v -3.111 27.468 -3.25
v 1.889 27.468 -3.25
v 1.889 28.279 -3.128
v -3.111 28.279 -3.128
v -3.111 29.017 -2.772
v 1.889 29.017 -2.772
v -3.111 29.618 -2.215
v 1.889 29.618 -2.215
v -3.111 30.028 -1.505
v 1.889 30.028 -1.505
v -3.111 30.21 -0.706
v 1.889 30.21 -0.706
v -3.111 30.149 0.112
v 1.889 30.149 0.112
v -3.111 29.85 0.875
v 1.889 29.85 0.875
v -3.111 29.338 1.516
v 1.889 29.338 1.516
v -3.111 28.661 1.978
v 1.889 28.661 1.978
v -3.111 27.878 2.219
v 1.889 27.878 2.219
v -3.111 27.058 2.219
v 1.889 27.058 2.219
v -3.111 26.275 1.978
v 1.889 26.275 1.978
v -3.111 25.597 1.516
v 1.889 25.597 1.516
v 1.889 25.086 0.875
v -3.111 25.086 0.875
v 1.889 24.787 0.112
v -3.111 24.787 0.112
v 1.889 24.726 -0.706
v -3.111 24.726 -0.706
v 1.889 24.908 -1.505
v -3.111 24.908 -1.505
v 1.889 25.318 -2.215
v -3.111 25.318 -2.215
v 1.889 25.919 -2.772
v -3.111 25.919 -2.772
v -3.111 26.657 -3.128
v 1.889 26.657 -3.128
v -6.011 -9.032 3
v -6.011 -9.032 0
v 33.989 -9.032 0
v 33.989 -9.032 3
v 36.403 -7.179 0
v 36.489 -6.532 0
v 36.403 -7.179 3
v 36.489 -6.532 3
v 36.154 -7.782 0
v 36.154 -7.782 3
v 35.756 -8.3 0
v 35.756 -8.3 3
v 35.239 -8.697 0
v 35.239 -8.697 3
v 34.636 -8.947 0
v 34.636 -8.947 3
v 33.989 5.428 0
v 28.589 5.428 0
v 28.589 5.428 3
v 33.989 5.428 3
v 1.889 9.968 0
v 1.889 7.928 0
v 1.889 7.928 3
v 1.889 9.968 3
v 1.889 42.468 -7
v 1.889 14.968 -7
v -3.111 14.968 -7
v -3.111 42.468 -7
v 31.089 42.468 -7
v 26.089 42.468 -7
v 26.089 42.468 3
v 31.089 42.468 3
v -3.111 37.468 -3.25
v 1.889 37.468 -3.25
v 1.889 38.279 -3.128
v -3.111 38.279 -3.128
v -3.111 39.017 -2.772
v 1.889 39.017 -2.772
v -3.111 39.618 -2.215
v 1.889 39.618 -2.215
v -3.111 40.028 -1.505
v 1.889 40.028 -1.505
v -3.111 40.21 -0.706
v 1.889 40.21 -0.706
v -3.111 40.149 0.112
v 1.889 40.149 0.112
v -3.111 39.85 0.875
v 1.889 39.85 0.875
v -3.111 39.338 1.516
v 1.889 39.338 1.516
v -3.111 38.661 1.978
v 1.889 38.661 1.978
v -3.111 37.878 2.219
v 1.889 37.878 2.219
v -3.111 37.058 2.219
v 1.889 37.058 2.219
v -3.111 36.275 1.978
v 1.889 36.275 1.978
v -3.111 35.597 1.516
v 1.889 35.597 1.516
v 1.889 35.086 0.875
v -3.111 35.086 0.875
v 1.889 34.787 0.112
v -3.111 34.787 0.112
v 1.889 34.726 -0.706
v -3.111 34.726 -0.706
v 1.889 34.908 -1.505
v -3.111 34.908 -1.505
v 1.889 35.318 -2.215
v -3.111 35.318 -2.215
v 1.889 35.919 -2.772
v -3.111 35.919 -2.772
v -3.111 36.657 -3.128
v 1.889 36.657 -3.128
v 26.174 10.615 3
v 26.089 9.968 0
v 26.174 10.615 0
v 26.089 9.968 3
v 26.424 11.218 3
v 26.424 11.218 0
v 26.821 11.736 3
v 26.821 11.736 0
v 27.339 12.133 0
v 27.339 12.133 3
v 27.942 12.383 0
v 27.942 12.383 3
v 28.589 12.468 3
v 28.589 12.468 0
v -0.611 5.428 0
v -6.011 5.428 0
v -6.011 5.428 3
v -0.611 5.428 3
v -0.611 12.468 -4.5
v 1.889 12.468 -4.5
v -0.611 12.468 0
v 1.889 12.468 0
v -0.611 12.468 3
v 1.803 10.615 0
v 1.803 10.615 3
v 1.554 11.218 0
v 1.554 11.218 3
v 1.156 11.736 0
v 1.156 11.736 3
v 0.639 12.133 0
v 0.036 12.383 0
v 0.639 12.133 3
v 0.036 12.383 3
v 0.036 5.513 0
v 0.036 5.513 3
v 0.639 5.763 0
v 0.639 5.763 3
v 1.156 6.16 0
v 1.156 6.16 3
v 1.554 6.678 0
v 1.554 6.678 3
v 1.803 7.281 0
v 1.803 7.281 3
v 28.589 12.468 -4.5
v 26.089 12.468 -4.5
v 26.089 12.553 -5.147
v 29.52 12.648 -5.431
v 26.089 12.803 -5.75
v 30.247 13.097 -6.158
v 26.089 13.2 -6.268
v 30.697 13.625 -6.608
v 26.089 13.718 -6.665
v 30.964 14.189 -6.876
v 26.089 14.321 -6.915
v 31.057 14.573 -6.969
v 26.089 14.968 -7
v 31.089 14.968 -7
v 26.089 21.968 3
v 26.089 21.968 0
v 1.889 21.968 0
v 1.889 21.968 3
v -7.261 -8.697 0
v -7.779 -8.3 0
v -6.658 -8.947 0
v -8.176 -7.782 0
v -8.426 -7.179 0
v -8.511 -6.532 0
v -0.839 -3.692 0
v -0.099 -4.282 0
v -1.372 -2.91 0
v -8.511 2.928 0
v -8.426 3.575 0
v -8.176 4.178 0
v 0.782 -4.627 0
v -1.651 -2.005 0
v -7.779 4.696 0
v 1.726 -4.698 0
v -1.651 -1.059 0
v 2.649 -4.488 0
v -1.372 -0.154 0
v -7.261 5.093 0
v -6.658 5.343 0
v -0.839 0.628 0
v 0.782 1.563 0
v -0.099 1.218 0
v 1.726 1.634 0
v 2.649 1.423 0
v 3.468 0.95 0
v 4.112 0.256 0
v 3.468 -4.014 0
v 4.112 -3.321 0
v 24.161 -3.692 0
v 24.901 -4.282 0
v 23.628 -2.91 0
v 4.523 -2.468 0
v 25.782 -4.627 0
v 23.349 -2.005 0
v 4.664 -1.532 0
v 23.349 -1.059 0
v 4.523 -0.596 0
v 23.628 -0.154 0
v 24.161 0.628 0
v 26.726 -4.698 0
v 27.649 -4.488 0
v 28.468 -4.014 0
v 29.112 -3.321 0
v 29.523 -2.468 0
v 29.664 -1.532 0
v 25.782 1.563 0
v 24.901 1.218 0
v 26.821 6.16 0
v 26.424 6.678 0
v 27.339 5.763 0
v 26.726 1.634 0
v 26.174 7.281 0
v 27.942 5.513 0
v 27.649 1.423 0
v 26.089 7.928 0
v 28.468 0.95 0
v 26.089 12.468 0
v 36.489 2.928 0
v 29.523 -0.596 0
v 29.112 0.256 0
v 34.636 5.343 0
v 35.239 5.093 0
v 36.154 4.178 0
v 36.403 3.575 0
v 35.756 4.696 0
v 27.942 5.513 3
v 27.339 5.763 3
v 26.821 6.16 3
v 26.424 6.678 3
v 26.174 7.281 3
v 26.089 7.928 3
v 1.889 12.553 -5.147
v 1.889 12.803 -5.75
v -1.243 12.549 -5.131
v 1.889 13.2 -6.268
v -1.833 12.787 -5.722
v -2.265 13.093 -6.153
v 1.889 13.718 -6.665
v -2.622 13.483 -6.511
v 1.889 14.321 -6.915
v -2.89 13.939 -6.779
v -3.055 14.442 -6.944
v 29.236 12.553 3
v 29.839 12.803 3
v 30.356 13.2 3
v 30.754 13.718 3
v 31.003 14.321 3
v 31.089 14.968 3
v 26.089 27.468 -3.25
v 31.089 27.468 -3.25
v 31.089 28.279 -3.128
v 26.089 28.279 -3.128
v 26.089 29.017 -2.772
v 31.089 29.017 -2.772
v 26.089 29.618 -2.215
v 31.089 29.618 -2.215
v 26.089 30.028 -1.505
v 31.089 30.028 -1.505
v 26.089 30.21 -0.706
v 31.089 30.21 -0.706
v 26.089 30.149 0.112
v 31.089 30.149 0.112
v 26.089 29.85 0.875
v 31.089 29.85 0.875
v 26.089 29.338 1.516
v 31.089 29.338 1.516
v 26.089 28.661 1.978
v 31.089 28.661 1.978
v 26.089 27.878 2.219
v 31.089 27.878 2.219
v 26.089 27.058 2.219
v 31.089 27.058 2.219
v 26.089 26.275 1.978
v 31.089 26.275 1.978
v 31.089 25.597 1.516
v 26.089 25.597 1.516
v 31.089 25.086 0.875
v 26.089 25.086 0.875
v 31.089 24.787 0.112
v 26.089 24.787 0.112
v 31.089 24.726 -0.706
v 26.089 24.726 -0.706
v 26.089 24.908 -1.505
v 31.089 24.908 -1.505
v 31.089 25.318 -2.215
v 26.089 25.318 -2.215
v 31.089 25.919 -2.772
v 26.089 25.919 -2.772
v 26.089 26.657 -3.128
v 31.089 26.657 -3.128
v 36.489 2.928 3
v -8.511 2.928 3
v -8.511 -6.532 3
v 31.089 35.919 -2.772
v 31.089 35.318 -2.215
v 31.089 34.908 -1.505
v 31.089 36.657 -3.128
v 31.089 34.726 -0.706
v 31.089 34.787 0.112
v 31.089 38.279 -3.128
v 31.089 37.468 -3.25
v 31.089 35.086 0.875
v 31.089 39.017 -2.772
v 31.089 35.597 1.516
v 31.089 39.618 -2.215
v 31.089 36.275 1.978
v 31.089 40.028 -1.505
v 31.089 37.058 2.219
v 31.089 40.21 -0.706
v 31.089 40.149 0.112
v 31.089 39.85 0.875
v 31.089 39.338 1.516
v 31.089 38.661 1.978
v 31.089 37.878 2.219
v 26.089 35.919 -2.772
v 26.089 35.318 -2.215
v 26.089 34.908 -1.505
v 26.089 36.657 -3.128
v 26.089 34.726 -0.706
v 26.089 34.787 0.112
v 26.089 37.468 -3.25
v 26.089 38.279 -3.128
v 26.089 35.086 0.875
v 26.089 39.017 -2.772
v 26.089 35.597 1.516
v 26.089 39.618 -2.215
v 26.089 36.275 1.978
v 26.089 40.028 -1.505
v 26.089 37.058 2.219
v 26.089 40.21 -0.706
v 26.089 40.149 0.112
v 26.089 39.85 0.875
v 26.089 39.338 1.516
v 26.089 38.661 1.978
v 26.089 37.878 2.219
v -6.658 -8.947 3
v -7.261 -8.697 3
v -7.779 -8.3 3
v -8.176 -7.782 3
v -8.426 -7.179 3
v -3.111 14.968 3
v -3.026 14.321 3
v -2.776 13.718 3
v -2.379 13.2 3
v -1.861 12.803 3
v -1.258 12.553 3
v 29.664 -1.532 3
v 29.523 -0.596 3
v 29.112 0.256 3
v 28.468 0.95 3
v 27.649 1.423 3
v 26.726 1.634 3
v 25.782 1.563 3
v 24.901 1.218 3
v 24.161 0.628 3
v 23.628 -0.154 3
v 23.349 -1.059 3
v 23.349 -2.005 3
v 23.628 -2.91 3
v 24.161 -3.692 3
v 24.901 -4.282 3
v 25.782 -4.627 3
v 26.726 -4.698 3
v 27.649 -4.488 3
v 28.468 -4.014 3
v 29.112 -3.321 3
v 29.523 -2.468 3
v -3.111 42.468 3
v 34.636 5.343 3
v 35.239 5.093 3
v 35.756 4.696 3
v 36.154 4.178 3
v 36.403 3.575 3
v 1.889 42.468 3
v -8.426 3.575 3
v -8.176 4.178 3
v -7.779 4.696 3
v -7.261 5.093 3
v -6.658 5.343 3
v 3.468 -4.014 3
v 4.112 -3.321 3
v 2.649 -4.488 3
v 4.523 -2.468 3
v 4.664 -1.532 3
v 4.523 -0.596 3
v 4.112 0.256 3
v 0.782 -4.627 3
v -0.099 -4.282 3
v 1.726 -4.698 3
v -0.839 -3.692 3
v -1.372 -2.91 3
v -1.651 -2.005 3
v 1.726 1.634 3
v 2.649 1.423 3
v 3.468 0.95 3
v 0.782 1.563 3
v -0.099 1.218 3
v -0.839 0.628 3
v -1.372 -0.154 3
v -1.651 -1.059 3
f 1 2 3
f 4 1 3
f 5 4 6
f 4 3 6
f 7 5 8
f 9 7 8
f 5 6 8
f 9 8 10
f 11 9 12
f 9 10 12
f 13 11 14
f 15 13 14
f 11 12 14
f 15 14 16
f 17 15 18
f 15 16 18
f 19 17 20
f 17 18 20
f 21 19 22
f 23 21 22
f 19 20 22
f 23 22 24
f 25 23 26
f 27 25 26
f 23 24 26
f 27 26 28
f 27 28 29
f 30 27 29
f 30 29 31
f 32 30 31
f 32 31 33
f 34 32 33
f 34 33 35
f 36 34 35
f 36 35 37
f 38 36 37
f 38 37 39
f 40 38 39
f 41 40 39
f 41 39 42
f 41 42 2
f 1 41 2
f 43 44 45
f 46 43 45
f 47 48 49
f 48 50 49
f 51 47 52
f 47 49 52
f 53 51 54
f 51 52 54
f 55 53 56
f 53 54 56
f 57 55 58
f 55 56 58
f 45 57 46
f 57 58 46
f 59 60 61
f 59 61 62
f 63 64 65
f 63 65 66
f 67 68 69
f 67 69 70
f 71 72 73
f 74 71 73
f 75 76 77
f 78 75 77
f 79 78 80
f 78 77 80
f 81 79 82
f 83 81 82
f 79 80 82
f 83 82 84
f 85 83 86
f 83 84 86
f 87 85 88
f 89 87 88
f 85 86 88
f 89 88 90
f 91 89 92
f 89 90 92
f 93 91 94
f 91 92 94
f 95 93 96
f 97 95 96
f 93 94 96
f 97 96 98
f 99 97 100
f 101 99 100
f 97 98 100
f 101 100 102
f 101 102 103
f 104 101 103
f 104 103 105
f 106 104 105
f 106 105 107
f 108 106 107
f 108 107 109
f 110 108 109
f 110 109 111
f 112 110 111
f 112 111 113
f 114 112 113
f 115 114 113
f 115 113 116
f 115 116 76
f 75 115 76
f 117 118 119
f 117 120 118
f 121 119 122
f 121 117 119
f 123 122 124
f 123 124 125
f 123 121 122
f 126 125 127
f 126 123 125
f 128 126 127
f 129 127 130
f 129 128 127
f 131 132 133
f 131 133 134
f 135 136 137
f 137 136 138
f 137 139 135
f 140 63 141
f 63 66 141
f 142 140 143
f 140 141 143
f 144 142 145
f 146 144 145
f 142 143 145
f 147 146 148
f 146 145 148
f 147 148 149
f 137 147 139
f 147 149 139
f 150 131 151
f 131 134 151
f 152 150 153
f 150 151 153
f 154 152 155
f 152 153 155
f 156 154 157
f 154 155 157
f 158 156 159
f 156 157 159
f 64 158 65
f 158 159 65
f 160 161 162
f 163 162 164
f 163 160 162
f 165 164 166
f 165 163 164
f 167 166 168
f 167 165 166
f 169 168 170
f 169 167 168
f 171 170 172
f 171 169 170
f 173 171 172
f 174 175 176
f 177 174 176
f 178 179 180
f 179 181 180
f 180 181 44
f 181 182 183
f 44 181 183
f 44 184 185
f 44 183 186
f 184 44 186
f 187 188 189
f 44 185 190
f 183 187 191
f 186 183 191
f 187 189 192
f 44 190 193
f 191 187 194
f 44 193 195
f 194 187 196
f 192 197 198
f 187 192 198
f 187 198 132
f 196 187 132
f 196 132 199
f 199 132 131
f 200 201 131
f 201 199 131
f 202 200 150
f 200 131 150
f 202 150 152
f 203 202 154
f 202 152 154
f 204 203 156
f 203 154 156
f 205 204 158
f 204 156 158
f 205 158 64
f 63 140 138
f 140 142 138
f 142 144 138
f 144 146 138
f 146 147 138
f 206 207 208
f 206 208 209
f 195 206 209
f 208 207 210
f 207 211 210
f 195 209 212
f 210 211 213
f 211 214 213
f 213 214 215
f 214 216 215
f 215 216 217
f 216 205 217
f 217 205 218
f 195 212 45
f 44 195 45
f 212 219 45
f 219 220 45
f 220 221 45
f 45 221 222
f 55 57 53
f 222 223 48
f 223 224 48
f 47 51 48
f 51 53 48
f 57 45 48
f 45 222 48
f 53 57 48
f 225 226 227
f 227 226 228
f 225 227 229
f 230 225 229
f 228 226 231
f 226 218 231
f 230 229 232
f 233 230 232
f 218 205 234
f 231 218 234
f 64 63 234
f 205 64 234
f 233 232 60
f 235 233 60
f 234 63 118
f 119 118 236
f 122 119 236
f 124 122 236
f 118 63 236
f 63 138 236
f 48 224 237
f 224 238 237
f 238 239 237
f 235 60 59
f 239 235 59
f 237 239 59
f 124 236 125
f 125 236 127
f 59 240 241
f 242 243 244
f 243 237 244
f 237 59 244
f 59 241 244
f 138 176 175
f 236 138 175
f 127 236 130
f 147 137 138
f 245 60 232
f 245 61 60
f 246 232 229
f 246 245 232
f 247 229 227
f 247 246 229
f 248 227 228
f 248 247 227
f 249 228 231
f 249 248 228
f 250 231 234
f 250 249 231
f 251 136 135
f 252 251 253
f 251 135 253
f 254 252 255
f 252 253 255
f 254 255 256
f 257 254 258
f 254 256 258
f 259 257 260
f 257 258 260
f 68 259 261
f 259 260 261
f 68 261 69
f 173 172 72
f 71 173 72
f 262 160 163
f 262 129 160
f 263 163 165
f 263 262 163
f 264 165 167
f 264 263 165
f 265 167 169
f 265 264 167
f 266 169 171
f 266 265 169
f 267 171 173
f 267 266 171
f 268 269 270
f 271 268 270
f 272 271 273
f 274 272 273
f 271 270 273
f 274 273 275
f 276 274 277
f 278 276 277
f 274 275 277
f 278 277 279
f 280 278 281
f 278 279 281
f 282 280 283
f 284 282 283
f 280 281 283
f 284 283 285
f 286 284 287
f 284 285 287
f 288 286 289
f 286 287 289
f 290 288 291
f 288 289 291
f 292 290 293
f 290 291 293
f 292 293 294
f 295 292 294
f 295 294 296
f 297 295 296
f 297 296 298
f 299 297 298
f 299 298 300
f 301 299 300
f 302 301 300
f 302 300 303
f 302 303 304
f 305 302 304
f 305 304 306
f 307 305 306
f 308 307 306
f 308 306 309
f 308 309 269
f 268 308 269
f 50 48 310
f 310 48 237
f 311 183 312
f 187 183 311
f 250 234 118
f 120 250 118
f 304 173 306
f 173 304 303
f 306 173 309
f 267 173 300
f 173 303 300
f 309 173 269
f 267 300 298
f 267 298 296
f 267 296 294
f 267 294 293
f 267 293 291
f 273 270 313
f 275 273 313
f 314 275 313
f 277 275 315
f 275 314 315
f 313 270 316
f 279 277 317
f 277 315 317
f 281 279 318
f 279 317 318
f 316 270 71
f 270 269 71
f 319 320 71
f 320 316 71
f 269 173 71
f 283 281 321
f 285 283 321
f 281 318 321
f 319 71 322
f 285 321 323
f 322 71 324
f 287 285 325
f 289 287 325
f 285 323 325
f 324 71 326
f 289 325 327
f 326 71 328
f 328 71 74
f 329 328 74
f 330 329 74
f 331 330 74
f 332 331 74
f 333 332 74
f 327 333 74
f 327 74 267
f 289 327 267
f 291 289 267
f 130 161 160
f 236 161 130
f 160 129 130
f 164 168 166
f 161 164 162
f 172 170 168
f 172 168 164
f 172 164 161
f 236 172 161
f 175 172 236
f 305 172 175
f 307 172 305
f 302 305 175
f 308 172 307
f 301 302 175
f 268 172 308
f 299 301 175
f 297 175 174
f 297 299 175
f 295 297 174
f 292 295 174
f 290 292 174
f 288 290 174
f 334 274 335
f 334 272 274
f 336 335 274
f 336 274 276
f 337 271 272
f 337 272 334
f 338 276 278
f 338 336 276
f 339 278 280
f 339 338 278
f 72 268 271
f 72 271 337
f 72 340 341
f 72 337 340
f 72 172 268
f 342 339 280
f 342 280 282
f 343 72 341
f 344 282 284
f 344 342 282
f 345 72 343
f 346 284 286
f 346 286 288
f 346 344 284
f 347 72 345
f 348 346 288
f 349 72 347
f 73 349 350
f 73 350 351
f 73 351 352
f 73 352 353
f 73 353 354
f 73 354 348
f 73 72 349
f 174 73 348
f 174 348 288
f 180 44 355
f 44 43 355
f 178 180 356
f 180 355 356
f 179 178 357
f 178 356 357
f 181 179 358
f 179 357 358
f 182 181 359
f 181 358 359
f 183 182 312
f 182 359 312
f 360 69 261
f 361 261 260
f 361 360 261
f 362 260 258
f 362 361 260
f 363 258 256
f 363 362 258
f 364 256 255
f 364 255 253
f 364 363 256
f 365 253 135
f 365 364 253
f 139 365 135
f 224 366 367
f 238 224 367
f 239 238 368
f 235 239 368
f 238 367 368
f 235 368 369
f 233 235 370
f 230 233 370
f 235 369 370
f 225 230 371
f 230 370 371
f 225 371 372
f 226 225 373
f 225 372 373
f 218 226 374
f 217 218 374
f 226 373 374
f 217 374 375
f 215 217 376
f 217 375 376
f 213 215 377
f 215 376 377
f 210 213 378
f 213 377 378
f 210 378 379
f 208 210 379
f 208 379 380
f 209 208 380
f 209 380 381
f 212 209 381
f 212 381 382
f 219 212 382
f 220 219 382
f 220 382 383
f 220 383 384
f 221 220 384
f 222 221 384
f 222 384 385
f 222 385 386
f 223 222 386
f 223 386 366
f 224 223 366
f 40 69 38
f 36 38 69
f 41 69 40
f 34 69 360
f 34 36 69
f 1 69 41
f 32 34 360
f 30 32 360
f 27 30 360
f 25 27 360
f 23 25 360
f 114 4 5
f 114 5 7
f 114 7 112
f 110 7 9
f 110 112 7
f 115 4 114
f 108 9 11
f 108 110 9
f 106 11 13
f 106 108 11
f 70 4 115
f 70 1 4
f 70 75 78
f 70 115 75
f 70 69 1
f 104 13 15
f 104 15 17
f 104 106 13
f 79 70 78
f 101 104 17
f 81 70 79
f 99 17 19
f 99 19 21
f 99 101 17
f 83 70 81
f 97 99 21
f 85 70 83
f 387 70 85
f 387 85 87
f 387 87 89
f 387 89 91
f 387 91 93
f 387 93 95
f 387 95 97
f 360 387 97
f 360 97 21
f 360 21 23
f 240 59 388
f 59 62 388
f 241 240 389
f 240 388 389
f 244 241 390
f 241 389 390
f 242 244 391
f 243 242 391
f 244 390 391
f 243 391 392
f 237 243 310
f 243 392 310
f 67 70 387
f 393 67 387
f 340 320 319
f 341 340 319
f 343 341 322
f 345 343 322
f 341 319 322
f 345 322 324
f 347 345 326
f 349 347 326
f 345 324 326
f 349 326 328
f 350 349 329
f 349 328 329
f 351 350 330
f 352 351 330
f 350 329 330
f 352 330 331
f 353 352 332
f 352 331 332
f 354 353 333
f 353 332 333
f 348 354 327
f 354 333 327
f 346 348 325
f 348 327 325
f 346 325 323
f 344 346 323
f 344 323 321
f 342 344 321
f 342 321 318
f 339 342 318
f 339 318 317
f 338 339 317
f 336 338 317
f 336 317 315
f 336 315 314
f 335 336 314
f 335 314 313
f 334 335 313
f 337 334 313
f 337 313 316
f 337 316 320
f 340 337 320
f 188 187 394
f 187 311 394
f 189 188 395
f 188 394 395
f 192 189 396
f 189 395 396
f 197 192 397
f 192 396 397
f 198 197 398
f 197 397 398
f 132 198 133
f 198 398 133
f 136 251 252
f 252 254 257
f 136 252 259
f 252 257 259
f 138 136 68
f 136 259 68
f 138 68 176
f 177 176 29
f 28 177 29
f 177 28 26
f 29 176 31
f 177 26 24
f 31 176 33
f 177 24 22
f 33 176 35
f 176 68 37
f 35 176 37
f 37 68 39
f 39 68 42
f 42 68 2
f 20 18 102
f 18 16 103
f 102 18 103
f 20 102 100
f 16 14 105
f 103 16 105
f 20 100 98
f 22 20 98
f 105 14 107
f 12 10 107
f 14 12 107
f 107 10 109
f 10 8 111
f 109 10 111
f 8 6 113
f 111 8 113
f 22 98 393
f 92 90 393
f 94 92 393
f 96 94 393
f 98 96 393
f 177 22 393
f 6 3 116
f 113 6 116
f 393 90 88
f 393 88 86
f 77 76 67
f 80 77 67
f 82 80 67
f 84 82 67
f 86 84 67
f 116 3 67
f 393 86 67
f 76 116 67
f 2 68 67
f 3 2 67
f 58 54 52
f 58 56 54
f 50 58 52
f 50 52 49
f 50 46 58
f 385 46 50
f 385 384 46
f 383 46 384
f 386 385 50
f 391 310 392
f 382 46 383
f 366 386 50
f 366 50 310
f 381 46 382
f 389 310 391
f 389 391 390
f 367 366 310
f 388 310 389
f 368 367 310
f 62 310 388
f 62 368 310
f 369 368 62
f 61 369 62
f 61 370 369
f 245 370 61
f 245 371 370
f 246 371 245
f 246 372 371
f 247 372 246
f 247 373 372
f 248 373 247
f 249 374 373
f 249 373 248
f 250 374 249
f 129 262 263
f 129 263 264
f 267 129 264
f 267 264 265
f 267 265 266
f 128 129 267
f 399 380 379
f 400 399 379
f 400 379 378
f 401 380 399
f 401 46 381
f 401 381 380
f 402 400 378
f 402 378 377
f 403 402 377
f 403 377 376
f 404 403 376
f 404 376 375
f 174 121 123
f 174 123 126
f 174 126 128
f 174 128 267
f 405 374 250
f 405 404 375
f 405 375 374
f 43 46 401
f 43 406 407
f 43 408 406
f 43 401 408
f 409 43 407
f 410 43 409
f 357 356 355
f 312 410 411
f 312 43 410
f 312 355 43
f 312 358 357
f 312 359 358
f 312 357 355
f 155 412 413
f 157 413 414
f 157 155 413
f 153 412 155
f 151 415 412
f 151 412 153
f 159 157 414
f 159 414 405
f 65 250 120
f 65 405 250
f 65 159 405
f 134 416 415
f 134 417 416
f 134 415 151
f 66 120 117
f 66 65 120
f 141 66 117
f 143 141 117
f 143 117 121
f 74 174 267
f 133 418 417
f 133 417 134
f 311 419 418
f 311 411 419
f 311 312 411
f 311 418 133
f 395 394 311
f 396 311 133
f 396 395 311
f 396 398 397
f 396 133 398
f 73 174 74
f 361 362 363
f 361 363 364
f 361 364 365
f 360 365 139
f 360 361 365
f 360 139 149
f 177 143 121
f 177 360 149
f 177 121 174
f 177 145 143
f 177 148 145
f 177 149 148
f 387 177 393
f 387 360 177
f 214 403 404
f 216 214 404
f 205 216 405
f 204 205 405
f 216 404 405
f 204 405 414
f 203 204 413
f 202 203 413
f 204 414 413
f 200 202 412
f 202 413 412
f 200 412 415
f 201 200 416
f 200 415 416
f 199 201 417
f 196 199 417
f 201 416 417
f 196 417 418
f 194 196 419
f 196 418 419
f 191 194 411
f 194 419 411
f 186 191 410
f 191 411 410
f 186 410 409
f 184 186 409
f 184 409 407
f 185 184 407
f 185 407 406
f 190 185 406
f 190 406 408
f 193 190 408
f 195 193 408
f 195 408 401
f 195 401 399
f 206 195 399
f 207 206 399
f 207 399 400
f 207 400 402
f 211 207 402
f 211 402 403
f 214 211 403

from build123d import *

# Parameters (mm, degrees)
SKETCH1_W                   = 45
SKETCH1_H                   = 14.46
BOSS_EXTRUDE1_DEPTH         = 3
F_1_4_0_25_DIAMETER_HOLE1_D = 6.35
SKETCH5_W                   = 24.2
SKETCH5_H                   = 37.04
BOSS_EXTRUDE2_DEPTH         = 3
SKETCH6_W                   = 10
SKETCH6_H                   = 30
BOSS_EXTRUDE3_DEPTH         = 5
BOSS_EXTRUDE4_START         = -29.2
SKETCH7_W                   = 10
SKETCH7_H                   = 30
BOSS_EXTRUDE4_DEPTH         = 5
SKETCH12_W                  = 24.2
SKETCH12_H                  = 20.5
CUT_EXTRUDE1_DEPTH          = 3
M5_CLEARANCE_HOLE1_D        = 5.5
FILLET3_R                   = 2.5
FILLET4_R                   = 2.5


with BuildPart() as part:
    # Sketch1 → Boss-Extrude1 (new body)
    with BuildSketch(Plane.XY):
        with Locations((13.988651535, -1.802042724)):
            Rectangle(SKETCH1_W, SKETCH1_H)
    extrude(amount=BOSS_EXTRUDE1_DEPTH)

    # 1/4 (0.25) Diameter Hole1 (through all)
    with Locations(Plane(origin=(0, 0, 0), x_dir=(-1, 0, 0), z_dir=(0, 0, -1))):
        with Locations((-26.488651535, -1.532042724), (-1.488651535, -1.532042724)):
            Hole(F_1_4_0_25_DIAMETER_HOLE1_D / 2)

    # Sketch5 → Boss-Extrude2 (add)
    with BuildSketch(Plane(origin=(0, 0, 0), x_dir=(-1, 0, 0), z_dir=(0, 0, -1))):
        with Locations((-13.988651535, 23.947957276)):
            Rectangle(SKETCH5_W, SKETCH5_H)
    extrude(amount=-BOSS_EXTRUDE2_DEPTH)

    # Sketch6 → Boss-Extrude3 (add)
    with BuildSketch(Plane.ZY.offset(-1.888651535)):
        with Locations((-2, 27.467957276)):
            Rectangle(SKETCH6_W, SKETCH6_H)
    extrude(amount=BOSS_EXTRUDE3_DEPTH)

    # Sketch7 → Boss-Extrude4 (add)
    with BuildSketch(Plane.ZY.offset(3.111348465).offset(BOSS_EXTRUDE4_START)):
        with Locations((-2, 27.467957276)):
            Rectangle(SKETCH7_W, SKETCH7_H)
    extrude(amount=-BOSS_EXTRUDE4_DEPTH)

    # Sketch12 → Cut-Extrude1 (cut)
    with BuildSketch(Plane(origin=(0, 0, 0), x_dir=(-1, 0, 0), z_dir=(0, 0, -1))):
        with Locations((-13.988651535, 32.217957276)):
            Rectangle(SKETCH12_W, SKETCH12_H)
    extrude(amount=-CUT_EXTRUDE1_DEPTH, mode=Mode.SUBTRACT)

    # M5 Clearance Hole1 (through all)
    with Locations(Plane.ZY.offset(3.111348465)):
        with Locations((-0.5, 37.467957276), (-0.5, 27.467957276)):
            Hole(M5_CLEARANCE_HOLE1_D / 2)

    # Fillet3
    fillet3_edges = [part.edges().sort_by_distance(p)[0] for p in [
        (-8.511348465, 5.427957276, 1.5),
        (36.488651535, 5.427957276, 1.5),
        (36.488651535, -9.032042724, 1.5),
        (-8.511348465, -9.032042724, 1.5),
    ]]
    fillet(fillet3_edges, radius=FILLET3_R)

    # Fillet4
    fillet4_edges = [part.edges().sort_by_distance(p)[0] for p in [
        (1.888651535, 5.427957276, 1.5),
        (26.088651535, 5.427957276, 1.5),
        (26.088651535, 12.467957276, 1.5),
        (1.888651535, 12.467957276, 1.5),
        (31.088651535, 12.467957276, -2),
        (-3.111348465, 12.467957276, -2),
        (28.588651535, 12.467957276, -7),
        (-0.611348465, 12.467957276, -7),
    ]]
    fillet(fillet4_edges, radius=FILLET4_R - 0.0001)  # a hair under: the kernel refuses the full size


solid = part.part
